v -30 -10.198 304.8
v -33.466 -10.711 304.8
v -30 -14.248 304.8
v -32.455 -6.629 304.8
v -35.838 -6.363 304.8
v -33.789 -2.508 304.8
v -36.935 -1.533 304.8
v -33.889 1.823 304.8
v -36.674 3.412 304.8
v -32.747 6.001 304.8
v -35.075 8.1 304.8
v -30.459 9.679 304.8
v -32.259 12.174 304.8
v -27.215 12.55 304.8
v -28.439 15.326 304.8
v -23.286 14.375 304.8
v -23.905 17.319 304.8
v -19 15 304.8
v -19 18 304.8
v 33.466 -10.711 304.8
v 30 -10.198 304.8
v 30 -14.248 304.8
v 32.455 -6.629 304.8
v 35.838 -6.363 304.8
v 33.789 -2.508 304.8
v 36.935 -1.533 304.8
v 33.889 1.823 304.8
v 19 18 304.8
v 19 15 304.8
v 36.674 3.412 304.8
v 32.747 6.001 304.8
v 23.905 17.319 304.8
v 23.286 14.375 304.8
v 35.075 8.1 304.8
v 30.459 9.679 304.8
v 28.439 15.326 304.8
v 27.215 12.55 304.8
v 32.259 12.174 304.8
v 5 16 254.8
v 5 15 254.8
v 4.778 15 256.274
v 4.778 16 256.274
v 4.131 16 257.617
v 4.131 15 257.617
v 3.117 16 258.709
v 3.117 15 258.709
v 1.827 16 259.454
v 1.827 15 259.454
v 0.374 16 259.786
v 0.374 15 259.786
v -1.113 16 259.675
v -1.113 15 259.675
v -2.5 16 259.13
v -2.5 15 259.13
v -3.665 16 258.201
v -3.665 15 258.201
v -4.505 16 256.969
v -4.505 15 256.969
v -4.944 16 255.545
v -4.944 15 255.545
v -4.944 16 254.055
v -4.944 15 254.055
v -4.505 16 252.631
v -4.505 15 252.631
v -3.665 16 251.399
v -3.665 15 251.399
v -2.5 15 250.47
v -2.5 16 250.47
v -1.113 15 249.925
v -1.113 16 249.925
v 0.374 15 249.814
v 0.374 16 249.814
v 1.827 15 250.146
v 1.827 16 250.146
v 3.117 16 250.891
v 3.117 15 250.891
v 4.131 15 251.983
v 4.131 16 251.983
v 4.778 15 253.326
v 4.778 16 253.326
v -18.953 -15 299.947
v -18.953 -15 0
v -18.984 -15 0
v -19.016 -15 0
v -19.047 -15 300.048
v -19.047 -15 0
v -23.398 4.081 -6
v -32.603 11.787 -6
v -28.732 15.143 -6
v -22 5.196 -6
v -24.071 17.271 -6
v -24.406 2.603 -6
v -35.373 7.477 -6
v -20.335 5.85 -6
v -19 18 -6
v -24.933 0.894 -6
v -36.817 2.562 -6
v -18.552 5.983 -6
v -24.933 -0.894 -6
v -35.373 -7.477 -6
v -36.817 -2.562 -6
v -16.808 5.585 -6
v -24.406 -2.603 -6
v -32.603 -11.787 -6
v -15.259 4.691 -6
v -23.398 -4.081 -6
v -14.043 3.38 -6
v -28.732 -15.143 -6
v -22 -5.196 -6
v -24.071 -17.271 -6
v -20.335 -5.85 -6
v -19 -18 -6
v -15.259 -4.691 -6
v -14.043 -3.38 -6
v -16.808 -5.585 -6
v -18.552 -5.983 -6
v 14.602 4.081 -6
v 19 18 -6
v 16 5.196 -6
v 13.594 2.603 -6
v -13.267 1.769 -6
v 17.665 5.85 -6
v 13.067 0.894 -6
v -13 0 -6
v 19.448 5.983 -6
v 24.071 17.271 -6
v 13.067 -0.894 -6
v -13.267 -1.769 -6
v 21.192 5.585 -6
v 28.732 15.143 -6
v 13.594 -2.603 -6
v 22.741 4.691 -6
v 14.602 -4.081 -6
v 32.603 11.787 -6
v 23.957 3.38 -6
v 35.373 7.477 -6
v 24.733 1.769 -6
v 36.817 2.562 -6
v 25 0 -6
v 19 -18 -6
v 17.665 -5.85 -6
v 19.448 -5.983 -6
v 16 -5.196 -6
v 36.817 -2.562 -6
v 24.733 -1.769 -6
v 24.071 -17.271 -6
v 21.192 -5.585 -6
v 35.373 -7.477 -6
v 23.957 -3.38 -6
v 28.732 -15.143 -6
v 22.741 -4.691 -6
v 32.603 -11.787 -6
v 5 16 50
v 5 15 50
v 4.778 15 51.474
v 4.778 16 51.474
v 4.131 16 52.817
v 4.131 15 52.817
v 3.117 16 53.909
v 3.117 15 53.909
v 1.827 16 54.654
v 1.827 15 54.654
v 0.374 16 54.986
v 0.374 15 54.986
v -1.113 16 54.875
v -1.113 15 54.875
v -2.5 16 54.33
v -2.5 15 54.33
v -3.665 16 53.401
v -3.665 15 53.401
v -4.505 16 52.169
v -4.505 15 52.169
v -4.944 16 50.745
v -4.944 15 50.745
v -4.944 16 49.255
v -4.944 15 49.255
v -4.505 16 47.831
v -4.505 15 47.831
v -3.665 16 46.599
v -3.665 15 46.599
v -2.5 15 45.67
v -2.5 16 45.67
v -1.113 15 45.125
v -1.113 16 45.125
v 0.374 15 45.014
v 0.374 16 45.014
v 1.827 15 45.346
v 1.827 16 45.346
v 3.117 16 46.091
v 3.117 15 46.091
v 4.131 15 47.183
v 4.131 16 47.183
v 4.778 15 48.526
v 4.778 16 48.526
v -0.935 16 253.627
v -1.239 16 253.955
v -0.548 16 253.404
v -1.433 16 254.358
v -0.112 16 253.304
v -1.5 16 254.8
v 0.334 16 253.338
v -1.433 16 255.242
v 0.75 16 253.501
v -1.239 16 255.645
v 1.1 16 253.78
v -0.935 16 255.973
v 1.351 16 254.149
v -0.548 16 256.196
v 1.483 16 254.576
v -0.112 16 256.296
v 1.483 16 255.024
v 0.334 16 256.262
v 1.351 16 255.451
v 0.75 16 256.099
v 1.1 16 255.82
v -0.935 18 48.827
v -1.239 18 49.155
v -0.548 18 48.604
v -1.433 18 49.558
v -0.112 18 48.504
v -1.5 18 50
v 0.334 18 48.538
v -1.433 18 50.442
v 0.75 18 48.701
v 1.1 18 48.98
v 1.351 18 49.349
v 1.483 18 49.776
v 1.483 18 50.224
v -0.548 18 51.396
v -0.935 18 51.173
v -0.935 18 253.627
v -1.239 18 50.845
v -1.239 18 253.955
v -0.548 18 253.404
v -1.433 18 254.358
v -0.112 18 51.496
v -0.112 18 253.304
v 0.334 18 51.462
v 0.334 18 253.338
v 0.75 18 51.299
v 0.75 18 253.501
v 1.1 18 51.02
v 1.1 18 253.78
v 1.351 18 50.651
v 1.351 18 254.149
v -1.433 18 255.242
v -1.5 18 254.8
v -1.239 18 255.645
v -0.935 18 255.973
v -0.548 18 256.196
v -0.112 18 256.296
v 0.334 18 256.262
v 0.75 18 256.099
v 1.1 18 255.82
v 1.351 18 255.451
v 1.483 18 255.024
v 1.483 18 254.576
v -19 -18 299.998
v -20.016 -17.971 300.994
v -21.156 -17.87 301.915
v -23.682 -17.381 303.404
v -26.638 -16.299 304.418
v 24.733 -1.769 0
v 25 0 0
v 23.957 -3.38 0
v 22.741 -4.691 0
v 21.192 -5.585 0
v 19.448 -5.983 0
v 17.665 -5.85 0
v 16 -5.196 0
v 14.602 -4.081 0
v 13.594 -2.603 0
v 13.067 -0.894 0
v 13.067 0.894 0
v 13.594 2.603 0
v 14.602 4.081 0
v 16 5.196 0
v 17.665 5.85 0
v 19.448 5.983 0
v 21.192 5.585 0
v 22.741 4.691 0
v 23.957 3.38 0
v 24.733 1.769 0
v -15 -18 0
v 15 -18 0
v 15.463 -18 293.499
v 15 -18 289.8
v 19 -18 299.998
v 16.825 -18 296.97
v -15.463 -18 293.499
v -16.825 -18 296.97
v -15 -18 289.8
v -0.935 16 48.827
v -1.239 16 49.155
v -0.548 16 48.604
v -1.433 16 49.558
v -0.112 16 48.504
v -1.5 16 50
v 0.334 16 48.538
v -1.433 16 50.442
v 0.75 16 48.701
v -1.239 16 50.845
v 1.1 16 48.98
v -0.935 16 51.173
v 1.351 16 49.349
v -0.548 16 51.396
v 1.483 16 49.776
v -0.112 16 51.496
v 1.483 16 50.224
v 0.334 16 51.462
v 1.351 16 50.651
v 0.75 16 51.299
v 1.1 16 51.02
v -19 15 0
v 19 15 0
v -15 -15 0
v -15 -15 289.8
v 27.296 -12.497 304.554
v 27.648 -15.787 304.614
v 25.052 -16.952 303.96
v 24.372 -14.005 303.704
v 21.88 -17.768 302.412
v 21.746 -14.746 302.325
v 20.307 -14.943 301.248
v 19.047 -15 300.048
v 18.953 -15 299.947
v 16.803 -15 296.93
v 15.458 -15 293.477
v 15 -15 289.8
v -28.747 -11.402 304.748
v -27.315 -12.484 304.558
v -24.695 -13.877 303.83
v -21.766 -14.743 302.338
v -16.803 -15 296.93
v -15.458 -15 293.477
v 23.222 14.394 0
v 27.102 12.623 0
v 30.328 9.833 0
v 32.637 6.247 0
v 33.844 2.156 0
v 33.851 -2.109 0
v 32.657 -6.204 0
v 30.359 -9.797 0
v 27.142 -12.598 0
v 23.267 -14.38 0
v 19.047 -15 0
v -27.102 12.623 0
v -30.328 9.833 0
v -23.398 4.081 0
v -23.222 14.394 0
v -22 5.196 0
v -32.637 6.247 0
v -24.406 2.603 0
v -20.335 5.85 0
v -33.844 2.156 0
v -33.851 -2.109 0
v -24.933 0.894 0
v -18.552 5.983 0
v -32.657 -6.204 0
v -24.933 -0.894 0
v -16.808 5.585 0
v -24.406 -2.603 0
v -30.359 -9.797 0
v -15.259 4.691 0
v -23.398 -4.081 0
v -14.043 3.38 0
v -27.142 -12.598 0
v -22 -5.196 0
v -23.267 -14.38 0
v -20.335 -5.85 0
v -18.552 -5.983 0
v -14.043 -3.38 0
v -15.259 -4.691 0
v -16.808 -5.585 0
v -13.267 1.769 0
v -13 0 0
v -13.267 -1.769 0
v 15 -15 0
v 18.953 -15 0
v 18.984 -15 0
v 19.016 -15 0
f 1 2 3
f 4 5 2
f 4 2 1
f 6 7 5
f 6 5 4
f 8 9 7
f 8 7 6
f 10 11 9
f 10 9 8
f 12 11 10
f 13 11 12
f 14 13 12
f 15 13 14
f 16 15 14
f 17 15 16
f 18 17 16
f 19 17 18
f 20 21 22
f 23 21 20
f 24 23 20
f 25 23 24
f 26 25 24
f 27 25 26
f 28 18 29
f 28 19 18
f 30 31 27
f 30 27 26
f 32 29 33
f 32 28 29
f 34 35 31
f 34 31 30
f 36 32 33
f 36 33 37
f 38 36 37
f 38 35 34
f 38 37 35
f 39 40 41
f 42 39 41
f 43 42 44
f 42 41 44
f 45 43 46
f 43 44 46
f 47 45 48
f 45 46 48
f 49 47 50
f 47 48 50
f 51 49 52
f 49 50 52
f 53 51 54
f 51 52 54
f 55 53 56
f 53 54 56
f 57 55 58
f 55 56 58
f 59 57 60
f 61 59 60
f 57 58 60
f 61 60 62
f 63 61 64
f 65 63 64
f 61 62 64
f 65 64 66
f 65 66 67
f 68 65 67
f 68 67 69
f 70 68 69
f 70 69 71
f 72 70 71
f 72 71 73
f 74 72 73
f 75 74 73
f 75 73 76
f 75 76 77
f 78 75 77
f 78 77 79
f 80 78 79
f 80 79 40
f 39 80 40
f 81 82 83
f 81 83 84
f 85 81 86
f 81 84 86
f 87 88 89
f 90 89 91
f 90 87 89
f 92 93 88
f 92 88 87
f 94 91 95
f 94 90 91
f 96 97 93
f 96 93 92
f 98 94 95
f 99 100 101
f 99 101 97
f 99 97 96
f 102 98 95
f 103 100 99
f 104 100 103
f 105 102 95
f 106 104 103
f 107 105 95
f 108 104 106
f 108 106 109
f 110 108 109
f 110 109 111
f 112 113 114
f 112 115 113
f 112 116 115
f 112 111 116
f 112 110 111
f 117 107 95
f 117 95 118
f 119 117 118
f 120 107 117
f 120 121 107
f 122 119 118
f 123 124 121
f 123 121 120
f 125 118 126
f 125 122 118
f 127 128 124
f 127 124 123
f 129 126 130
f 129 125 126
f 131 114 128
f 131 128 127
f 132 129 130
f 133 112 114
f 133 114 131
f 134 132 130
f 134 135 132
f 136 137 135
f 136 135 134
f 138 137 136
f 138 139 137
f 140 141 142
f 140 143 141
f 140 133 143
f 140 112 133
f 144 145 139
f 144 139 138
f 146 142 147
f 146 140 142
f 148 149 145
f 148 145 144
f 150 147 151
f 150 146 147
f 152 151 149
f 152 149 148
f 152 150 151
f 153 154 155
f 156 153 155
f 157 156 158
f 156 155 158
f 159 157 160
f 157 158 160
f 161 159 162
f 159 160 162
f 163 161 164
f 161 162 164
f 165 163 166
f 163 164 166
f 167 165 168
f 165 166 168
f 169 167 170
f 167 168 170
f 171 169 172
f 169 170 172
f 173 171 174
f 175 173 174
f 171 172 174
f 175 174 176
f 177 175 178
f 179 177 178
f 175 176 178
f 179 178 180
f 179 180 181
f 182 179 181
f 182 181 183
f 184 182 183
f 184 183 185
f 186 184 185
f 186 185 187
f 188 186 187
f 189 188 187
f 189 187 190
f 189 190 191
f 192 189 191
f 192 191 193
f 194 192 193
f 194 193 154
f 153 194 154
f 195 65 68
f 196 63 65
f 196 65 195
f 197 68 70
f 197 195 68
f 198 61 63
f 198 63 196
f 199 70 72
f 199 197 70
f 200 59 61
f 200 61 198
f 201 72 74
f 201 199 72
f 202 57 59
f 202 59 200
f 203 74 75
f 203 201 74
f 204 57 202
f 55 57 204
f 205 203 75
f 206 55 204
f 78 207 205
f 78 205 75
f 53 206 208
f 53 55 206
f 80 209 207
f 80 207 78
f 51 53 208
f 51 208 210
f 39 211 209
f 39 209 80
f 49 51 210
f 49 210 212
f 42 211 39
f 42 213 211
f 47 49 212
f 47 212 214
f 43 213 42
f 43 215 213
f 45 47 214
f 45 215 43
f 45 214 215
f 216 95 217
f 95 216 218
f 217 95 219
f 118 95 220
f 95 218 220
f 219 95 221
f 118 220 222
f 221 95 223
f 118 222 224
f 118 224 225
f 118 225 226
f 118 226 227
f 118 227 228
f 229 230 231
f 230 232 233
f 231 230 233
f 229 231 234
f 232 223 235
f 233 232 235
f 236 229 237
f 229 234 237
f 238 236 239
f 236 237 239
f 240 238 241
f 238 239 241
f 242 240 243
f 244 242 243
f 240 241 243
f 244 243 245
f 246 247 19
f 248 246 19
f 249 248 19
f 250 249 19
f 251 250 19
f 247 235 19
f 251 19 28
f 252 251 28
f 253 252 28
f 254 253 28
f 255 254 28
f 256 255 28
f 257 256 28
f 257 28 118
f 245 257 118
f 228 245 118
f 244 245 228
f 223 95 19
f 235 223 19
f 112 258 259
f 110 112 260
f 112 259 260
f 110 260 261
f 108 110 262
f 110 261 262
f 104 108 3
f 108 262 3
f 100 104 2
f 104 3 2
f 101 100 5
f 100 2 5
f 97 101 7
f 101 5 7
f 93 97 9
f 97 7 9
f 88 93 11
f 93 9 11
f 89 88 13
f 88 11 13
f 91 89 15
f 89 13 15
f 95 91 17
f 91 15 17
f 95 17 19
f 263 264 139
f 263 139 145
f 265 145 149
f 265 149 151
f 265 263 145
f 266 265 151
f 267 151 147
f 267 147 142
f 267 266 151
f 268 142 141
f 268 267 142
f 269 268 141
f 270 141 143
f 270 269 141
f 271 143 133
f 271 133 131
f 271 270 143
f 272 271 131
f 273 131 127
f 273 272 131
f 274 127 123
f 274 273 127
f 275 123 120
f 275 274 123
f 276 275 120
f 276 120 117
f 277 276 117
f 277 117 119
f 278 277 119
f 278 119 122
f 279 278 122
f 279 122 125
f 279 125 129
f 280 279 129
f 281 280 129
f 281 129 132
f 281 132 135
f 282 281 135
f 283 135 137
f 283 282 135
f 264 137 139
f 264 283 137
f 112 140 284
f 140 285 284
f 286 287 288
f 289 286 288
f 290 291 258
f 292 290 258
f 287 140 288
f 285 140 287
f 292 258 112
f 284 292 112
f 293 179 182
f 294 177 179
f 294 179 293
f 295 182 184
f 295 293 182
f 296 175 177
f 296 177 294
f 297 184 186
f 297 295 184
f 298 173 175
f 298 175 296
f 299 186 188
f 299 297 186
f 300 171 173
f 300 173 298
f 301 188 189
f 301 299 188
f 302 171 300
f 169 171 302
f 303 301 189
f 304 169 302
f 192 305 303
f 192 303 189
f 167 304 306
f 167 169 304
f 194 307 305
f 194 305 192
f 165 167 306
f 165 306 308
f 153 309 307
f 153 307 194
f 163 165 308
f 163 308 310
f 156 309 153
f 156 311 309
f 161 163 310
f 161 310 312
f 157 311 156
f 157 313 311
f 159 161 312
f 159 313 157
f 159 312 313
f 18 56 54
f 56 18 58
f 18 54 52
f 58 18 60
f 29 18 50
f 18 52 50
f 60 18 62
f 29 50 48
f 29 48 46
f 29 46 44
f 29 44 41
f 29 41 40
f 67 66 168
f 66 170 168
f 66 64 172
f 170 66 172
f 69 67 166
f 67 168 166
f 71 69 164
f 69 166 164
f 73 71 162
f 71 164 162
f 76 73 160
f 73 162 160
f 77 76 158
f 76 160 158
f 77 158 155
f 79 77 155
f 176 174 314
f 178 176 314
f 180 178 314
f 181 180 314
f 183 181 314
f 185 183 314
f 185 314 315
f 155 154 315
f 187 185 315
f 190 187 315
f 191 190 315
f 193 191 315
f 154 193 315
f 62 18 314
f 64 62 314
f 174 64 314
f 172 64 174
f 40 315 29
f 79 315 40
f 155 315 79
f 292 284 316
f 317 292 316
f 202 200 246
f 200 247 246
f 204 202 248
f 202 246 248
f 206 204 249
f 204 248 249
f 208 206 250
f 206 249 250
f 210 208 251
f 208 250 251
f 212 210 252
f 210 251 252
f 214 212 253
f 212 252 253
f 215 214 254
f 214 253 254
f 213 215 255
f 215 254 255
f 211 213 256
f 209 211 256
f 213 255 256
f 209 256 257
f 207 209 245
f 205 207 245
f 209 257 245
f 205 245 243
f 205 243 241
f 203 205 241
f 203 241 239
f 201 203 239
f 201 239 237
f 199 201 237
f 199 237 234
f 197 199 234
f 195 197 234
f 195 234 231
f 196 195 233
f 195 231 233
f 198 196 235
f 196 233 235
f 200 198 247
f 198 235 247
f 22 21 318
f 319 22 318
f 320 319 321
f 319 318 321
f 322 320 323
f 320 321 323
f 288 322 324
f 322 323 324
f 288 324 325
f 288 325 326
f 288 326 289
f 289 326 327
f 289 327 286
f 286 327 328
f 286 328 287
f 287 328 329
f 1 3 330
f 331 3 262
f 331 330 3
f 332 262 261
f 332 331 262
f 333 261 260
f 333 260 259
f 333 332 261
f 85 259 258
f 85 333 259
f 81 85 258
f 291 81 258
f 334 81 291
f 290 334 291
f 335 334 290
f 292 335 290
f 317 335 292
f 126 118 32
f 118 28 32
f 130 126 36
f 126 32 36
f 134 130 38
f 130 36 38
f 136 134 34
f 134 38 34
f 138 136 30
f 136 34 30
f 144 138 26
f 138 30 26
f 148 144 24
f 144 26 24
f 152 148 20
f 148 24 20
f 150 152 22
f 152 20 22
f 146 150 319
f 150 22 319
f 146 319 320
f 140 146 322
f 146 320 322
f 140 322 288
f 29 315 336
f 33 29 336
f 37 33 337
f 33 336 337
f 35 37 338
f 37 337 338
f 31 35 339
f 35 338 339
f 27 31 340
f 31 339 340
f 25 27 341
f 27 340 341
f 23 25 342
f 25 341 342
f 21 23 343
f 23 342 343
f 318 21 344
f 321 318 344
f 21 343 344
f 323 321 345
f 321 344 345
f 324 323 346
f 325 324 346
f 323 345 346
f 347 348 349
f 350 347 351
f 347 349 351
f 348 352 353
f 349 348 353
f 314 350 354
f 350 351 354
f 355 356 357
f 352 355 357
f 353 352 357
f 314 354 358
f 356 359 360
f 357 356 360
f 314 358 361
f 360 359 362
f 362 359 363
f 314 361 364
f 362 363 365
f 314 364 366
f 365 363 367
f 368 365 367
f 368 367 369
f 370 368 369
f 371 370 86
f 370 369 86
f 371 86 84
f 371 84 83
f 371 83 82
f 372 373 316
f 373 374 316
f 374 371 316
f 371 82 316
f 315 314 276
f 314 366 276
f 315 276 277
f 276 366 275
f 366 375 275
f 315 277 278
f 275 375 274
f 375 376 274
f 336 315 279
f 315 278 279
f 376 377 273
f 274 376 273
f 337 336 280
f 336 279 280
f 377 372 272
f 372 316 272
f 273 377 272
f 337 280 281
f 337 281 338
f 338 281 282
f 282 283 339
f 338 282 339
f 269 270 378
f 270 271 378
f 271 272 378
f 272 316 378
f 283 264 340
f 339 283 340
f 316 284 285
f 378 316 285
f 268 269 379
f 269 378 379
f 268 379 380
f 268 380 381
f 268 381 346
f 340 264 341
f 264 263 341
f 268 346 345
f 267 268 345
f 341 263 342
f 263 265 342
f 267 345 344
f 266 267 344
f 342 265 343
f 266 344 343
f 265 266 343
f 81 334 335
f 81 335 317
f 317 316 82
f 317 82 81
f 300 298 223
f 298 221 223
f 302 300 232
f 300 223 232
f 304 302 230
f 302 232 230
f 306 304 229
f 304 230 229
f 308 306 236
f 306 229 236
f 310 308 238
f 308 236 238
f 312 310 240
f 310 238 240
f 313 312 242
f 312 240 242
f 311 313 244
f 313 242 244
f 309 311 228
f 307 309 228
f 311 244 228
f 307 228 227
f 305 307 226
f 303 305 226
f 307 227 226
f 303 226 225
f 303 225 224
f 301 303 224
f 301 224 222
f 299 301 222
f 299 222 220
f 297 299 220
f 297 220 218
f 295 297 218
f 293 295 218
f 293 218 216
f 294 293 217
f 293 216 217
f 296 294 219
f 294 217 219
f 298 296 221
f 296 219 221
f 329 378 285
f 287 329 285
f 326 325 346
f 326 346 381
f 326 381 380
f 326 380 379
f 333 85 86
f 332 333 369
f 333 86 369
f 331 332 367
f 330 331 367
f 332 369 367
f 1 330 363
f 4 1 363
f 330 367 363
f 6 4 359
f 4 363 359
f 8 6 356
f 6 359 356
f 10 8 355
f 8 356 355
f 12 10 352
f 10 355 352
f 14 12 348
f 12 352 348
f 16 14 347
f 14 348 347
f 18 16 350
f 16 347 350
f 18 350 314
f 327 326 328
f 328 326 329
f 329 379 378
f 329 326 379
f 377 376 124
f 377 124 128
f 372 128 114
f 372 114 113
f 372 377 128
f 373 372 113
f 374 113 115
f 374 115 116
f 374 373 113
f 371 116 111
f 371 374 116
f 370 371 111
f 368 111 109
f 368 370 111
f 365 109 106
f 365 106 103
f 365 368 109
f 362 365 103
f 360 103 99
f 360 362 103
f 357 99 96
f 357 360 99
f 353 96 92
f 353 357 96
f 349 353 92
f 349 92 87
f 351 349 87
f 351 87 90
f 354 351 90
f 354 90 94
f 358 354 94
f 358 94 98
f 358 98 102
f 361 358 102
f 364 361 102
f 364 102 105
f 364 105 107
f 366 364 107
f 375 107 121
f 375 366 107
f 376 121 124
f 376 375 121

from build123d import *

# Parameters (mm, degrees)
F1_DEPTH       = 304.8
F2_T1_DEPTH    = 33.0000735539
F4_D           = 3
F4_CBORE_D     = 10
F4_CBORE_DEPTH = 1
F5_R           = 6
F6_DEPTH       = 6


# Not quite as in the source:
# - a fillet or chamfer that OpenCascade refuses, or shapes differently, is made with other operations: its cross-section is extruded or revolved along the edge and cut away or added


with BuildPart() as f1:
    # F0 (on Top) → F1 (new body)
    with BuildSketch(Plane.XY):
        with BuildLine():
            ThreePointArc((-19.0469745753, -14.9999264461), (-33.9999816115, 0.0234873165), (-19, 15))
            Line((-19, 15), (0, 15))
            Line((0, 15), (19, 15))
            ThreePointArc((19, 15), (33.9999816115, 0.0234873165), (19.0469745753, -14.9999264461))
            ThreePointArc((19.0469745753, -14.9999264461), (19, -15), (18.9530254247, -14.9999264461))
            Line((18.9530254247, -14.9999264461), (15, -14.9999264461))
            Line((15, -14.9999264461), (15, -18))
            Line((15, -18), (19, -18))
            ThreePointArc((19, -18), (37, 0), (19, 18))
            Line((19, 18), (0, 18))
            Line((0, 18), (-19, 18))
            ThreePointArc((-19, 18), (-37, 0), (-19, -18))
            Line((-19, -18), (-15, -18))
            Line((-15, -18), (-15, -14.9999264461))
            Line((-15, -14.9999264461), (-18.9530254247, -14.9999264461))
            ThreePointArc((-18.9530254247, -14.9999264461), (-19, -15), (-19.0469745753, -14.9999264461))
        make_face()
    extrude(amount=F1_DEPTH)

    # F2: fillet of radius 15 on 2 edges, made by hand

    # F2_s2 → F2_t1 (cut)
    with BuildSketch(Plane.XZ.offset(-7.35539e-05)):
        with BuildLine():
            ThreePointArc((-30, 304.8), (-19.3933982822, 300.4066017178), (-15, 289.8))
            Line((-15, 289.8), (-14.7, 289.8))
            Line((-14.7, 289.8), (-14.7, 305.1))
            Line((-14.7, 305.1), (-30, 305.1))
            Line((-30, 305.1), (-30, 304.8))
        make_face()
        with BuildLine():
            ThreePointArc((30, 304.8), (19.3933982822, 300.4066017178), (15, 289.8))
            Line((15, 289.8), (14.7, 289.8))
            Line((14.7, 289.8), (14.7, 305.1))
            Line((14.7, 305.1), (30, 305.1))
            Line((30, 305.1), (30, 304.8))
        make_face()
    extrude(amount=F2_T1_DEPTH, mode=Mode.SUBTRACT)

    # F4 (through all)
    with Locations(Plane.XZ.offset(-15)):
        with Locations((0, 254.8), (0, 50)):
            CounterBoreHole(F4_D / 2, F4_CBORE_D / 2, F4_CBORE_DEPTH)

    # F5 (on face) → F6 (join)
    with BuildSketch(Plane(origin=(0, 0, 0), x_dir=(1, 0, 0), z_dir=(0, 0, -1))):
        with BuildLine():
            ThreePointArc((-19, 18), (-37, 0), (-19, -18))
            Line((-19, -18), (19, -18))
            ThreePointArc((19, -18), (37, 0), (19, 18))
            Line((19, 18), (-19, 18))
        make_face()
        with Locations((-19, 0)):
            Circle(F5_R, mode=Mode.SUBTRACT)
        with Locations((19, 0)):
            Circle(F5_R, mode=Mode.SUBTRACT)
    extrude(amount=F6_DEPTH)


solid = f1.part
